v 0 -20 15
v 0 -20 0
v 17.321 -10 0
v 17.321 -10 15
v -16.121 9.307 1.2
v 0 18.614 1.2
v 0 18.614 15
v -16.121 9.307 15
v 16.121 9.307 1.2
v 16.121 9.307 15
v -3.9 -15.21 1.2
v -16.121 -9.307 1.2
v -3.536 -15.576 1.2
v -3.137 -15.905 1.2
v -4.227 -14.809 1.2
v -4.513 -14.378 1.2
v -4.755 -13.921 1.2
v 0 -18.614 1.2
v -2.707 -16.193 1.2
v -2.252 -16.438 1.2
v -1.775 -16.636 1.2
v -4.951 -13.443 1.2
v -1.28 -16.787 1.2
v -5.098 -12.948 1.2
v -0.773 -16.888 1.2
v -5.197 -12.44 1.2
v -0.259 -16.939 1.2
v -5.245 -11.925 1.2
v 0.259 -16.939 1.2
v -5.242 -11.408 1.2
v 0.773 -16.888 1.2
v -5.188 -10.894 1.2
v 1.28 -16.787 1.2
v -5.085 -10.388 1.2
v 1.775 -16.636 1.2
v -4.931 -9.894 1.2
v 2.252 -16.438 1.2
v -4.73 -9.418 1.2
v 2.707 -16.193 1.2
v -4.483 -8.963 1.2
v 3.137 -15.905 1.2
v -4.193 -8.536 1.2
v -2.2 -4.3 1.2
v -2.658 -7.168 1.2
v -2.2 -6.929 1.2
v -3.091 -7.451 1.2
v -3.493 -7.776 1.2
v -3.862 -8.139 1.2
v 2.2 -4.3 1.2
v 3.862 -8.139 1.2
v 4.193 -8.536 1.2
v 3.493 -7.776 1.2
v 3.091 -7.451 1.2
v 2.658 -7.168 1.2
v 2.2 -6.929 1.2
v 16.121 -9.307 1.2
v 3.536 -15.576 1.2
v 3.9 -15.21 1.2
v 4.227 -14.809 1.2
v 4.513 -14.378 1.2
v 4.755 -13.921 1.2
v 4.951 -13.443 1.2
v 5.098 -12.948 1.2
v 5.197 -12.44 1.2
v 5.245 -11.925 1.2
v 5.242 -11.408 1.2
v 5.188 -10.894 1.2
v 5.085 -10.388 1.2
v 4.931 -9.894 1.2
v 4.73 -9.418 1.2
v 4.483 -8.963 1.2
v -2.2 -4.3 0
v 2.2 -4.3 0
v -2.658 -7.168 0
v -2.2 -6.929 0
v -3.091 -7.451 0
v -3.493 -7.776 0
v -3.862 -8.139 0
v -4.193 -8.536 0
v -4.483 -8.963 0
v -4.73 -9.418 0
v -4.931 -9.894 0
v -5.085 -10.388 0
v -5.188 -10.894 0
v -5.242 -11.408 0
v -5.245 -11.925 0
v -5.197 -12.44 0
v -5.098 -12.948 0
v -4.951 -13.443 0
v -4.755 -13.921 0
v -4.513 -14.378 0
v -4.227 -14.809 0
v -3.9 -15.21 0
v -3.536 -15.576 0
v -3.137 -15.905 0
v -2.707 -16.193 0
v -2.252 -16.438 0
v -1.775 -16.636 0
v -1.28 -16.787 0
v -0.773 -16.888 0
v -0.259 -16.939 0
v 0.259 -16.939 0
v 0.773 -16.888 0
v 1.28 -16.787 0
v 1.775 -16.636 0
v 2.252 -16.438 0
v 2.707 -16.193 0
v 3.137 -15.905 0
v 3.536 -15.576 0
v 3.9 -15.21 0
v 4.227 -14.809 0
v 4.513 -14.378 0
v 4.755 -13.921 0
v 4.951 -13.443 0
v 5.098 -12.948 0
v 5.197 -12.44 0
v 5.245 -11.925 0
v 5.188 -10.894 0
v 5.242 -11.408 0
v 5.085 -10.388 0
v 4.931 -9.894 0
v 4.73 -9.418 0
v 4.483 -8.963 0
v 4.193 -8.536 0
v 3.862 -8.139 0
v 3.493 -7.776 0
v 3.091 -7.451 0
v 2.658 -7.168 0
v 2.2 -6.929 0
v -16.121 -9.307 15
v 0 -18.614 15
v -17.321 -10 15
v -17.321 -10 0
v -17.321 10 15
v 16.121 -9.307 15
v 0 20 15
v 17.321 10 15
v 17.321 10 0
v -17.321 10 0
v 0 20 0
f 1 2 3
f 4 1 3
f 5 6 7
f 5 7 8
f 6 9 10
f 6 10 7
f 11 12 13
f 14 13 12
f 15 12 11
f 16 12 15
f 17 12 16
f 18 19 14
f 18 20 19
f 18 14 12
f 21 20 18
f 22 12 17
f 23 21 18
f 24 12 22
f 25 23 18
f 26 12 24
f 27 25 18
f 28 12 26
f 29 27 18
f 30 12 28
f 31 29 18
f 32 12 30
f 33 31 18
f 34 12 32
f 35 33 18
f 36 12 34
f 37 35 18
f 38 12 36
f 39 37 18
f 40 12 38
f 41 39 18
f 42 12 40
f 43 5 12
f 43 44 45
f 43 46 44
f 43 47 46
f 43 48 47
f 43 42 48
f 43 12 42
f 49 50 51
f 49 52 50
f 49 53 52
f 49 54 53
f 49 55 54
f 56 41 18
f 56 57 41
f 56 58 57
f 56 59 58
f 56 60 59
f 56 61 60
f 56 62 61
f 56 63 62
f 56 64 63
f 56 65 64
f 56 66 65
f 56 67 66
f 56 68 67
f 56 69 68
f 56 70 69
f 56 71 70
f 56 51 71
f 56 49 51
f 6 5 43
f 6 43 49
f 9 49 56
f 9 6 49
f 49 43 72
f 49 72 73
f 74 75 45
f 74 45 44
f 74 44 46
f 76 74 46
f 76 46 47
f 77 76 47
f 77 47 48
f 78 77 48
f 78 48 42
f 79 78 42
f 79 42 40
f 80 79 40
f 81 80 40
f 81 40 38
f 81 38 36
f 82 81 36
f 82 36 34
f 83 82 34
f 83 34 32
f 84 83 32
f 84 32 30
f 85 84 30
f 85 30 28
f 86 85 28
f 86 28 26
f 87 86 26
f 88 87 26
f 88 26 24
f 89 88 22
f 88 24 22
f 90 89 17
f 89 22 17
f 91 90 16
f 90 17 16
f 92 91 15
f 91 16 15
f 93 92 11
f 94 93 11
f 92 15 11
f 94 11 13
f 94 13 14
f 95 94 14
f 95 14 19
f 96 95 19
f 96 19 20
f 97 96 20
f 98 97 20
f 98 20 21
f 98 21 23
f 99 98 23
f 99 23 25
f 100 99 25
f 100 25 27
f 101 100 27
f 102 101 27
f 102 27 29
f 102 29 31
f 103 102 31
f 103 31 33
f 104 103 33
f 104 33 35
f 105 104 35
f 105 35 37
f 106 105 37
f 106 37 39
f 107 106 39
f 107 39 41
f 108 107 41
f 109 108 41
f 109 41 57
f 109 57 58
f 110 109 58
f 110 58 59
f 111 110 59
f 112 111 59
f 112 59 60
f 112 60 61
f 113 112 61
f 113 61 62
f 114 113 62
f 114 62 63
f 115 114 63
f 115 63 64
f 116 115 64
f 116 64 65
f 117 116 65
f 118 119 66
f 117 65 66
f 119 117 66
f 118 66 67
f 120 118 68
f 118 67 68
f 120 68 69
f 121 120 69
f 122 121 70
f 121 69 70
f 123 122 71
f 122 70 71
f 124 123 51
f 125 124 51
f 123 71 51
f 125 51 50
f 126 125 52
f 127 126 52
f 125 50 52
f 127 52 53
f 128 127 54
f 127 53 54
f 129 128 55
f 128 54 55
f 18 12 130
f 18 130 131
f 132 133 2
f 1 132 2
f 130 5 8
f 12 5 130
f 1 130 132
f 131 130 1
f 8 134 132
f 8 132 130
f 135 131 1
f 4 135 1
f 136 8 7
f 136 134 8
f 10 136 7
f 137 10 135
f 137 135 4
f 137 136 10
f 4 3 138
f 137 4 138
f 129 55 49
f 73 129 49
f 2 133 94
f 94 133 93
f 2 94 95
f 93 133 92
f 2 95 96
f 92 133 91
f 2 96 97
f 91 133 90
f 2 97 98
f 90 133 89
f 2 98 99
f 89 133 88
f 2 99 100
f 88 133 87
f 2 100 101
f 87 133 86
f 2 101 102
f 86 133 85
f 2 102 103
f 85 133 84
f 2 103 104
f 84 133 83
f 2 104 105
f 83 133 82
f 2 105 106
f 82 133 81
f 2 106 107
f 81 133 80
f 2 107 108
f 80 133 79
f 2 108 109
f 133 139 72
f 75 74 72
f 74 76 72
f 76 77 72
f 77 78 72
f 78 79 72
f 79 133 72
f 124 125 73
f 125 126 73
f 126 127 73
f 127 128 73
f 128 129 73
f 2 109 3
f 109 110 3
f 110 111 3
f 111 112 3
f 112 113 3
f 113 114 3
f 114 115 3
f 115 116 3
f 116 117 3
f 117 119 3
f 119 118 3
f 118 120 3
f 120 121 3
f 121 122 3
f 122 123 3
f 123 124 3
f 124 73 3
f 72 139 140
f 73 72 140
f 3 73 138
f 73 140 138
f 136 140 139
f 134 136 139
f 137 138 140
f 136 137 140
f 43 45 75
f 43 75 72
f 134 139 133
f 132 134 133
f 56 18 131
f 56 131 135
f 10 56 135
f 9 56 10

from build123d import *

# Parameters (mm, degrees)
LINEAR_AUSTRAGEN_D_NN1_DEPTH    = 15
AUFSATZ_LINEAR_AUSTRAGEN1_DEPTH = 1.2
SKIZZE3_R                       = 5.25
SCHNITT_LINEAR_AUSTRAGEN1_DEPTH = 1.2
SKIZZE4_W                       = 4.4
SKIZZE4_H                       = 4.707579954
SCHNITT_LINEAR_AUSTRAGEN2_DEPTH = 1.2


with BuildPart() as part:
    # Skizze1 → Linear-Austragen-Dünn1 (new body)
    with BuildSketch(Plane.XY):
        Polygon((0, -20), (17.320508076, -10), (17.320508076, 10), (0, 20), (-17.320508076, 10), (-17.320508076, -10), align=None)
        Polygon((0, -18.614359354), (16.120508076, -9.307179677), (16.120508076, 9.307179677), (0, 18.614359354), (-16.120508076, 9.307179677), (-16.120508076, -9.307179677), align=None, mode=Mode.SUBTRACT)
    extrude(amount=LINEAR_AUSTRAGEN_D_NN1_DEPTH)

    # Skizze2 → Aufsatz-Linear austragen1 (add)
    with BuildSketch(Plane(origin=(0, 0, 0), x_dir=(-1, 0, 0), z_dir=(0, 0, -1))):
        Polygon((-16.120508076, -9.307179677), (-16.120508076, 9.307179677), (0, 18.614359354), (16.120508076, 9.307179677), (16.120508076, -9.307179677), (0, -18.614359354), align=None)
    extrude(amount=-AUFSATZ_LINEAR_AUSTRAGEN1_DEPTH)

    # Skizze3 → Schnitt-Linear austragen1 (cut)
    with BuildSketch(Plane.XY.offset(1.2)):
        with Locations((0, -11.695345197)):
            Circle(SKIZZE3_R)
    extrude(amount=-SCHNITT_LINEAR_AUSTRAGEN1_DEPTH, mode=Mode.SUBTRACT)

    # Skizze4 → Schnitt-Linear austragen2 (cut)
    with BuildSketch(Plane.XY.offset(1.2)):
        with Locations((0, -6.653789977)):
            Rectangle(SKIZZE4_W, SKIZZE4_H)
    extrude(amount=-SCHNITT_LINEAR_AUSTRAGEN2_DEPTH, mode=Mode.SUBTRACT)


solid = part.part
